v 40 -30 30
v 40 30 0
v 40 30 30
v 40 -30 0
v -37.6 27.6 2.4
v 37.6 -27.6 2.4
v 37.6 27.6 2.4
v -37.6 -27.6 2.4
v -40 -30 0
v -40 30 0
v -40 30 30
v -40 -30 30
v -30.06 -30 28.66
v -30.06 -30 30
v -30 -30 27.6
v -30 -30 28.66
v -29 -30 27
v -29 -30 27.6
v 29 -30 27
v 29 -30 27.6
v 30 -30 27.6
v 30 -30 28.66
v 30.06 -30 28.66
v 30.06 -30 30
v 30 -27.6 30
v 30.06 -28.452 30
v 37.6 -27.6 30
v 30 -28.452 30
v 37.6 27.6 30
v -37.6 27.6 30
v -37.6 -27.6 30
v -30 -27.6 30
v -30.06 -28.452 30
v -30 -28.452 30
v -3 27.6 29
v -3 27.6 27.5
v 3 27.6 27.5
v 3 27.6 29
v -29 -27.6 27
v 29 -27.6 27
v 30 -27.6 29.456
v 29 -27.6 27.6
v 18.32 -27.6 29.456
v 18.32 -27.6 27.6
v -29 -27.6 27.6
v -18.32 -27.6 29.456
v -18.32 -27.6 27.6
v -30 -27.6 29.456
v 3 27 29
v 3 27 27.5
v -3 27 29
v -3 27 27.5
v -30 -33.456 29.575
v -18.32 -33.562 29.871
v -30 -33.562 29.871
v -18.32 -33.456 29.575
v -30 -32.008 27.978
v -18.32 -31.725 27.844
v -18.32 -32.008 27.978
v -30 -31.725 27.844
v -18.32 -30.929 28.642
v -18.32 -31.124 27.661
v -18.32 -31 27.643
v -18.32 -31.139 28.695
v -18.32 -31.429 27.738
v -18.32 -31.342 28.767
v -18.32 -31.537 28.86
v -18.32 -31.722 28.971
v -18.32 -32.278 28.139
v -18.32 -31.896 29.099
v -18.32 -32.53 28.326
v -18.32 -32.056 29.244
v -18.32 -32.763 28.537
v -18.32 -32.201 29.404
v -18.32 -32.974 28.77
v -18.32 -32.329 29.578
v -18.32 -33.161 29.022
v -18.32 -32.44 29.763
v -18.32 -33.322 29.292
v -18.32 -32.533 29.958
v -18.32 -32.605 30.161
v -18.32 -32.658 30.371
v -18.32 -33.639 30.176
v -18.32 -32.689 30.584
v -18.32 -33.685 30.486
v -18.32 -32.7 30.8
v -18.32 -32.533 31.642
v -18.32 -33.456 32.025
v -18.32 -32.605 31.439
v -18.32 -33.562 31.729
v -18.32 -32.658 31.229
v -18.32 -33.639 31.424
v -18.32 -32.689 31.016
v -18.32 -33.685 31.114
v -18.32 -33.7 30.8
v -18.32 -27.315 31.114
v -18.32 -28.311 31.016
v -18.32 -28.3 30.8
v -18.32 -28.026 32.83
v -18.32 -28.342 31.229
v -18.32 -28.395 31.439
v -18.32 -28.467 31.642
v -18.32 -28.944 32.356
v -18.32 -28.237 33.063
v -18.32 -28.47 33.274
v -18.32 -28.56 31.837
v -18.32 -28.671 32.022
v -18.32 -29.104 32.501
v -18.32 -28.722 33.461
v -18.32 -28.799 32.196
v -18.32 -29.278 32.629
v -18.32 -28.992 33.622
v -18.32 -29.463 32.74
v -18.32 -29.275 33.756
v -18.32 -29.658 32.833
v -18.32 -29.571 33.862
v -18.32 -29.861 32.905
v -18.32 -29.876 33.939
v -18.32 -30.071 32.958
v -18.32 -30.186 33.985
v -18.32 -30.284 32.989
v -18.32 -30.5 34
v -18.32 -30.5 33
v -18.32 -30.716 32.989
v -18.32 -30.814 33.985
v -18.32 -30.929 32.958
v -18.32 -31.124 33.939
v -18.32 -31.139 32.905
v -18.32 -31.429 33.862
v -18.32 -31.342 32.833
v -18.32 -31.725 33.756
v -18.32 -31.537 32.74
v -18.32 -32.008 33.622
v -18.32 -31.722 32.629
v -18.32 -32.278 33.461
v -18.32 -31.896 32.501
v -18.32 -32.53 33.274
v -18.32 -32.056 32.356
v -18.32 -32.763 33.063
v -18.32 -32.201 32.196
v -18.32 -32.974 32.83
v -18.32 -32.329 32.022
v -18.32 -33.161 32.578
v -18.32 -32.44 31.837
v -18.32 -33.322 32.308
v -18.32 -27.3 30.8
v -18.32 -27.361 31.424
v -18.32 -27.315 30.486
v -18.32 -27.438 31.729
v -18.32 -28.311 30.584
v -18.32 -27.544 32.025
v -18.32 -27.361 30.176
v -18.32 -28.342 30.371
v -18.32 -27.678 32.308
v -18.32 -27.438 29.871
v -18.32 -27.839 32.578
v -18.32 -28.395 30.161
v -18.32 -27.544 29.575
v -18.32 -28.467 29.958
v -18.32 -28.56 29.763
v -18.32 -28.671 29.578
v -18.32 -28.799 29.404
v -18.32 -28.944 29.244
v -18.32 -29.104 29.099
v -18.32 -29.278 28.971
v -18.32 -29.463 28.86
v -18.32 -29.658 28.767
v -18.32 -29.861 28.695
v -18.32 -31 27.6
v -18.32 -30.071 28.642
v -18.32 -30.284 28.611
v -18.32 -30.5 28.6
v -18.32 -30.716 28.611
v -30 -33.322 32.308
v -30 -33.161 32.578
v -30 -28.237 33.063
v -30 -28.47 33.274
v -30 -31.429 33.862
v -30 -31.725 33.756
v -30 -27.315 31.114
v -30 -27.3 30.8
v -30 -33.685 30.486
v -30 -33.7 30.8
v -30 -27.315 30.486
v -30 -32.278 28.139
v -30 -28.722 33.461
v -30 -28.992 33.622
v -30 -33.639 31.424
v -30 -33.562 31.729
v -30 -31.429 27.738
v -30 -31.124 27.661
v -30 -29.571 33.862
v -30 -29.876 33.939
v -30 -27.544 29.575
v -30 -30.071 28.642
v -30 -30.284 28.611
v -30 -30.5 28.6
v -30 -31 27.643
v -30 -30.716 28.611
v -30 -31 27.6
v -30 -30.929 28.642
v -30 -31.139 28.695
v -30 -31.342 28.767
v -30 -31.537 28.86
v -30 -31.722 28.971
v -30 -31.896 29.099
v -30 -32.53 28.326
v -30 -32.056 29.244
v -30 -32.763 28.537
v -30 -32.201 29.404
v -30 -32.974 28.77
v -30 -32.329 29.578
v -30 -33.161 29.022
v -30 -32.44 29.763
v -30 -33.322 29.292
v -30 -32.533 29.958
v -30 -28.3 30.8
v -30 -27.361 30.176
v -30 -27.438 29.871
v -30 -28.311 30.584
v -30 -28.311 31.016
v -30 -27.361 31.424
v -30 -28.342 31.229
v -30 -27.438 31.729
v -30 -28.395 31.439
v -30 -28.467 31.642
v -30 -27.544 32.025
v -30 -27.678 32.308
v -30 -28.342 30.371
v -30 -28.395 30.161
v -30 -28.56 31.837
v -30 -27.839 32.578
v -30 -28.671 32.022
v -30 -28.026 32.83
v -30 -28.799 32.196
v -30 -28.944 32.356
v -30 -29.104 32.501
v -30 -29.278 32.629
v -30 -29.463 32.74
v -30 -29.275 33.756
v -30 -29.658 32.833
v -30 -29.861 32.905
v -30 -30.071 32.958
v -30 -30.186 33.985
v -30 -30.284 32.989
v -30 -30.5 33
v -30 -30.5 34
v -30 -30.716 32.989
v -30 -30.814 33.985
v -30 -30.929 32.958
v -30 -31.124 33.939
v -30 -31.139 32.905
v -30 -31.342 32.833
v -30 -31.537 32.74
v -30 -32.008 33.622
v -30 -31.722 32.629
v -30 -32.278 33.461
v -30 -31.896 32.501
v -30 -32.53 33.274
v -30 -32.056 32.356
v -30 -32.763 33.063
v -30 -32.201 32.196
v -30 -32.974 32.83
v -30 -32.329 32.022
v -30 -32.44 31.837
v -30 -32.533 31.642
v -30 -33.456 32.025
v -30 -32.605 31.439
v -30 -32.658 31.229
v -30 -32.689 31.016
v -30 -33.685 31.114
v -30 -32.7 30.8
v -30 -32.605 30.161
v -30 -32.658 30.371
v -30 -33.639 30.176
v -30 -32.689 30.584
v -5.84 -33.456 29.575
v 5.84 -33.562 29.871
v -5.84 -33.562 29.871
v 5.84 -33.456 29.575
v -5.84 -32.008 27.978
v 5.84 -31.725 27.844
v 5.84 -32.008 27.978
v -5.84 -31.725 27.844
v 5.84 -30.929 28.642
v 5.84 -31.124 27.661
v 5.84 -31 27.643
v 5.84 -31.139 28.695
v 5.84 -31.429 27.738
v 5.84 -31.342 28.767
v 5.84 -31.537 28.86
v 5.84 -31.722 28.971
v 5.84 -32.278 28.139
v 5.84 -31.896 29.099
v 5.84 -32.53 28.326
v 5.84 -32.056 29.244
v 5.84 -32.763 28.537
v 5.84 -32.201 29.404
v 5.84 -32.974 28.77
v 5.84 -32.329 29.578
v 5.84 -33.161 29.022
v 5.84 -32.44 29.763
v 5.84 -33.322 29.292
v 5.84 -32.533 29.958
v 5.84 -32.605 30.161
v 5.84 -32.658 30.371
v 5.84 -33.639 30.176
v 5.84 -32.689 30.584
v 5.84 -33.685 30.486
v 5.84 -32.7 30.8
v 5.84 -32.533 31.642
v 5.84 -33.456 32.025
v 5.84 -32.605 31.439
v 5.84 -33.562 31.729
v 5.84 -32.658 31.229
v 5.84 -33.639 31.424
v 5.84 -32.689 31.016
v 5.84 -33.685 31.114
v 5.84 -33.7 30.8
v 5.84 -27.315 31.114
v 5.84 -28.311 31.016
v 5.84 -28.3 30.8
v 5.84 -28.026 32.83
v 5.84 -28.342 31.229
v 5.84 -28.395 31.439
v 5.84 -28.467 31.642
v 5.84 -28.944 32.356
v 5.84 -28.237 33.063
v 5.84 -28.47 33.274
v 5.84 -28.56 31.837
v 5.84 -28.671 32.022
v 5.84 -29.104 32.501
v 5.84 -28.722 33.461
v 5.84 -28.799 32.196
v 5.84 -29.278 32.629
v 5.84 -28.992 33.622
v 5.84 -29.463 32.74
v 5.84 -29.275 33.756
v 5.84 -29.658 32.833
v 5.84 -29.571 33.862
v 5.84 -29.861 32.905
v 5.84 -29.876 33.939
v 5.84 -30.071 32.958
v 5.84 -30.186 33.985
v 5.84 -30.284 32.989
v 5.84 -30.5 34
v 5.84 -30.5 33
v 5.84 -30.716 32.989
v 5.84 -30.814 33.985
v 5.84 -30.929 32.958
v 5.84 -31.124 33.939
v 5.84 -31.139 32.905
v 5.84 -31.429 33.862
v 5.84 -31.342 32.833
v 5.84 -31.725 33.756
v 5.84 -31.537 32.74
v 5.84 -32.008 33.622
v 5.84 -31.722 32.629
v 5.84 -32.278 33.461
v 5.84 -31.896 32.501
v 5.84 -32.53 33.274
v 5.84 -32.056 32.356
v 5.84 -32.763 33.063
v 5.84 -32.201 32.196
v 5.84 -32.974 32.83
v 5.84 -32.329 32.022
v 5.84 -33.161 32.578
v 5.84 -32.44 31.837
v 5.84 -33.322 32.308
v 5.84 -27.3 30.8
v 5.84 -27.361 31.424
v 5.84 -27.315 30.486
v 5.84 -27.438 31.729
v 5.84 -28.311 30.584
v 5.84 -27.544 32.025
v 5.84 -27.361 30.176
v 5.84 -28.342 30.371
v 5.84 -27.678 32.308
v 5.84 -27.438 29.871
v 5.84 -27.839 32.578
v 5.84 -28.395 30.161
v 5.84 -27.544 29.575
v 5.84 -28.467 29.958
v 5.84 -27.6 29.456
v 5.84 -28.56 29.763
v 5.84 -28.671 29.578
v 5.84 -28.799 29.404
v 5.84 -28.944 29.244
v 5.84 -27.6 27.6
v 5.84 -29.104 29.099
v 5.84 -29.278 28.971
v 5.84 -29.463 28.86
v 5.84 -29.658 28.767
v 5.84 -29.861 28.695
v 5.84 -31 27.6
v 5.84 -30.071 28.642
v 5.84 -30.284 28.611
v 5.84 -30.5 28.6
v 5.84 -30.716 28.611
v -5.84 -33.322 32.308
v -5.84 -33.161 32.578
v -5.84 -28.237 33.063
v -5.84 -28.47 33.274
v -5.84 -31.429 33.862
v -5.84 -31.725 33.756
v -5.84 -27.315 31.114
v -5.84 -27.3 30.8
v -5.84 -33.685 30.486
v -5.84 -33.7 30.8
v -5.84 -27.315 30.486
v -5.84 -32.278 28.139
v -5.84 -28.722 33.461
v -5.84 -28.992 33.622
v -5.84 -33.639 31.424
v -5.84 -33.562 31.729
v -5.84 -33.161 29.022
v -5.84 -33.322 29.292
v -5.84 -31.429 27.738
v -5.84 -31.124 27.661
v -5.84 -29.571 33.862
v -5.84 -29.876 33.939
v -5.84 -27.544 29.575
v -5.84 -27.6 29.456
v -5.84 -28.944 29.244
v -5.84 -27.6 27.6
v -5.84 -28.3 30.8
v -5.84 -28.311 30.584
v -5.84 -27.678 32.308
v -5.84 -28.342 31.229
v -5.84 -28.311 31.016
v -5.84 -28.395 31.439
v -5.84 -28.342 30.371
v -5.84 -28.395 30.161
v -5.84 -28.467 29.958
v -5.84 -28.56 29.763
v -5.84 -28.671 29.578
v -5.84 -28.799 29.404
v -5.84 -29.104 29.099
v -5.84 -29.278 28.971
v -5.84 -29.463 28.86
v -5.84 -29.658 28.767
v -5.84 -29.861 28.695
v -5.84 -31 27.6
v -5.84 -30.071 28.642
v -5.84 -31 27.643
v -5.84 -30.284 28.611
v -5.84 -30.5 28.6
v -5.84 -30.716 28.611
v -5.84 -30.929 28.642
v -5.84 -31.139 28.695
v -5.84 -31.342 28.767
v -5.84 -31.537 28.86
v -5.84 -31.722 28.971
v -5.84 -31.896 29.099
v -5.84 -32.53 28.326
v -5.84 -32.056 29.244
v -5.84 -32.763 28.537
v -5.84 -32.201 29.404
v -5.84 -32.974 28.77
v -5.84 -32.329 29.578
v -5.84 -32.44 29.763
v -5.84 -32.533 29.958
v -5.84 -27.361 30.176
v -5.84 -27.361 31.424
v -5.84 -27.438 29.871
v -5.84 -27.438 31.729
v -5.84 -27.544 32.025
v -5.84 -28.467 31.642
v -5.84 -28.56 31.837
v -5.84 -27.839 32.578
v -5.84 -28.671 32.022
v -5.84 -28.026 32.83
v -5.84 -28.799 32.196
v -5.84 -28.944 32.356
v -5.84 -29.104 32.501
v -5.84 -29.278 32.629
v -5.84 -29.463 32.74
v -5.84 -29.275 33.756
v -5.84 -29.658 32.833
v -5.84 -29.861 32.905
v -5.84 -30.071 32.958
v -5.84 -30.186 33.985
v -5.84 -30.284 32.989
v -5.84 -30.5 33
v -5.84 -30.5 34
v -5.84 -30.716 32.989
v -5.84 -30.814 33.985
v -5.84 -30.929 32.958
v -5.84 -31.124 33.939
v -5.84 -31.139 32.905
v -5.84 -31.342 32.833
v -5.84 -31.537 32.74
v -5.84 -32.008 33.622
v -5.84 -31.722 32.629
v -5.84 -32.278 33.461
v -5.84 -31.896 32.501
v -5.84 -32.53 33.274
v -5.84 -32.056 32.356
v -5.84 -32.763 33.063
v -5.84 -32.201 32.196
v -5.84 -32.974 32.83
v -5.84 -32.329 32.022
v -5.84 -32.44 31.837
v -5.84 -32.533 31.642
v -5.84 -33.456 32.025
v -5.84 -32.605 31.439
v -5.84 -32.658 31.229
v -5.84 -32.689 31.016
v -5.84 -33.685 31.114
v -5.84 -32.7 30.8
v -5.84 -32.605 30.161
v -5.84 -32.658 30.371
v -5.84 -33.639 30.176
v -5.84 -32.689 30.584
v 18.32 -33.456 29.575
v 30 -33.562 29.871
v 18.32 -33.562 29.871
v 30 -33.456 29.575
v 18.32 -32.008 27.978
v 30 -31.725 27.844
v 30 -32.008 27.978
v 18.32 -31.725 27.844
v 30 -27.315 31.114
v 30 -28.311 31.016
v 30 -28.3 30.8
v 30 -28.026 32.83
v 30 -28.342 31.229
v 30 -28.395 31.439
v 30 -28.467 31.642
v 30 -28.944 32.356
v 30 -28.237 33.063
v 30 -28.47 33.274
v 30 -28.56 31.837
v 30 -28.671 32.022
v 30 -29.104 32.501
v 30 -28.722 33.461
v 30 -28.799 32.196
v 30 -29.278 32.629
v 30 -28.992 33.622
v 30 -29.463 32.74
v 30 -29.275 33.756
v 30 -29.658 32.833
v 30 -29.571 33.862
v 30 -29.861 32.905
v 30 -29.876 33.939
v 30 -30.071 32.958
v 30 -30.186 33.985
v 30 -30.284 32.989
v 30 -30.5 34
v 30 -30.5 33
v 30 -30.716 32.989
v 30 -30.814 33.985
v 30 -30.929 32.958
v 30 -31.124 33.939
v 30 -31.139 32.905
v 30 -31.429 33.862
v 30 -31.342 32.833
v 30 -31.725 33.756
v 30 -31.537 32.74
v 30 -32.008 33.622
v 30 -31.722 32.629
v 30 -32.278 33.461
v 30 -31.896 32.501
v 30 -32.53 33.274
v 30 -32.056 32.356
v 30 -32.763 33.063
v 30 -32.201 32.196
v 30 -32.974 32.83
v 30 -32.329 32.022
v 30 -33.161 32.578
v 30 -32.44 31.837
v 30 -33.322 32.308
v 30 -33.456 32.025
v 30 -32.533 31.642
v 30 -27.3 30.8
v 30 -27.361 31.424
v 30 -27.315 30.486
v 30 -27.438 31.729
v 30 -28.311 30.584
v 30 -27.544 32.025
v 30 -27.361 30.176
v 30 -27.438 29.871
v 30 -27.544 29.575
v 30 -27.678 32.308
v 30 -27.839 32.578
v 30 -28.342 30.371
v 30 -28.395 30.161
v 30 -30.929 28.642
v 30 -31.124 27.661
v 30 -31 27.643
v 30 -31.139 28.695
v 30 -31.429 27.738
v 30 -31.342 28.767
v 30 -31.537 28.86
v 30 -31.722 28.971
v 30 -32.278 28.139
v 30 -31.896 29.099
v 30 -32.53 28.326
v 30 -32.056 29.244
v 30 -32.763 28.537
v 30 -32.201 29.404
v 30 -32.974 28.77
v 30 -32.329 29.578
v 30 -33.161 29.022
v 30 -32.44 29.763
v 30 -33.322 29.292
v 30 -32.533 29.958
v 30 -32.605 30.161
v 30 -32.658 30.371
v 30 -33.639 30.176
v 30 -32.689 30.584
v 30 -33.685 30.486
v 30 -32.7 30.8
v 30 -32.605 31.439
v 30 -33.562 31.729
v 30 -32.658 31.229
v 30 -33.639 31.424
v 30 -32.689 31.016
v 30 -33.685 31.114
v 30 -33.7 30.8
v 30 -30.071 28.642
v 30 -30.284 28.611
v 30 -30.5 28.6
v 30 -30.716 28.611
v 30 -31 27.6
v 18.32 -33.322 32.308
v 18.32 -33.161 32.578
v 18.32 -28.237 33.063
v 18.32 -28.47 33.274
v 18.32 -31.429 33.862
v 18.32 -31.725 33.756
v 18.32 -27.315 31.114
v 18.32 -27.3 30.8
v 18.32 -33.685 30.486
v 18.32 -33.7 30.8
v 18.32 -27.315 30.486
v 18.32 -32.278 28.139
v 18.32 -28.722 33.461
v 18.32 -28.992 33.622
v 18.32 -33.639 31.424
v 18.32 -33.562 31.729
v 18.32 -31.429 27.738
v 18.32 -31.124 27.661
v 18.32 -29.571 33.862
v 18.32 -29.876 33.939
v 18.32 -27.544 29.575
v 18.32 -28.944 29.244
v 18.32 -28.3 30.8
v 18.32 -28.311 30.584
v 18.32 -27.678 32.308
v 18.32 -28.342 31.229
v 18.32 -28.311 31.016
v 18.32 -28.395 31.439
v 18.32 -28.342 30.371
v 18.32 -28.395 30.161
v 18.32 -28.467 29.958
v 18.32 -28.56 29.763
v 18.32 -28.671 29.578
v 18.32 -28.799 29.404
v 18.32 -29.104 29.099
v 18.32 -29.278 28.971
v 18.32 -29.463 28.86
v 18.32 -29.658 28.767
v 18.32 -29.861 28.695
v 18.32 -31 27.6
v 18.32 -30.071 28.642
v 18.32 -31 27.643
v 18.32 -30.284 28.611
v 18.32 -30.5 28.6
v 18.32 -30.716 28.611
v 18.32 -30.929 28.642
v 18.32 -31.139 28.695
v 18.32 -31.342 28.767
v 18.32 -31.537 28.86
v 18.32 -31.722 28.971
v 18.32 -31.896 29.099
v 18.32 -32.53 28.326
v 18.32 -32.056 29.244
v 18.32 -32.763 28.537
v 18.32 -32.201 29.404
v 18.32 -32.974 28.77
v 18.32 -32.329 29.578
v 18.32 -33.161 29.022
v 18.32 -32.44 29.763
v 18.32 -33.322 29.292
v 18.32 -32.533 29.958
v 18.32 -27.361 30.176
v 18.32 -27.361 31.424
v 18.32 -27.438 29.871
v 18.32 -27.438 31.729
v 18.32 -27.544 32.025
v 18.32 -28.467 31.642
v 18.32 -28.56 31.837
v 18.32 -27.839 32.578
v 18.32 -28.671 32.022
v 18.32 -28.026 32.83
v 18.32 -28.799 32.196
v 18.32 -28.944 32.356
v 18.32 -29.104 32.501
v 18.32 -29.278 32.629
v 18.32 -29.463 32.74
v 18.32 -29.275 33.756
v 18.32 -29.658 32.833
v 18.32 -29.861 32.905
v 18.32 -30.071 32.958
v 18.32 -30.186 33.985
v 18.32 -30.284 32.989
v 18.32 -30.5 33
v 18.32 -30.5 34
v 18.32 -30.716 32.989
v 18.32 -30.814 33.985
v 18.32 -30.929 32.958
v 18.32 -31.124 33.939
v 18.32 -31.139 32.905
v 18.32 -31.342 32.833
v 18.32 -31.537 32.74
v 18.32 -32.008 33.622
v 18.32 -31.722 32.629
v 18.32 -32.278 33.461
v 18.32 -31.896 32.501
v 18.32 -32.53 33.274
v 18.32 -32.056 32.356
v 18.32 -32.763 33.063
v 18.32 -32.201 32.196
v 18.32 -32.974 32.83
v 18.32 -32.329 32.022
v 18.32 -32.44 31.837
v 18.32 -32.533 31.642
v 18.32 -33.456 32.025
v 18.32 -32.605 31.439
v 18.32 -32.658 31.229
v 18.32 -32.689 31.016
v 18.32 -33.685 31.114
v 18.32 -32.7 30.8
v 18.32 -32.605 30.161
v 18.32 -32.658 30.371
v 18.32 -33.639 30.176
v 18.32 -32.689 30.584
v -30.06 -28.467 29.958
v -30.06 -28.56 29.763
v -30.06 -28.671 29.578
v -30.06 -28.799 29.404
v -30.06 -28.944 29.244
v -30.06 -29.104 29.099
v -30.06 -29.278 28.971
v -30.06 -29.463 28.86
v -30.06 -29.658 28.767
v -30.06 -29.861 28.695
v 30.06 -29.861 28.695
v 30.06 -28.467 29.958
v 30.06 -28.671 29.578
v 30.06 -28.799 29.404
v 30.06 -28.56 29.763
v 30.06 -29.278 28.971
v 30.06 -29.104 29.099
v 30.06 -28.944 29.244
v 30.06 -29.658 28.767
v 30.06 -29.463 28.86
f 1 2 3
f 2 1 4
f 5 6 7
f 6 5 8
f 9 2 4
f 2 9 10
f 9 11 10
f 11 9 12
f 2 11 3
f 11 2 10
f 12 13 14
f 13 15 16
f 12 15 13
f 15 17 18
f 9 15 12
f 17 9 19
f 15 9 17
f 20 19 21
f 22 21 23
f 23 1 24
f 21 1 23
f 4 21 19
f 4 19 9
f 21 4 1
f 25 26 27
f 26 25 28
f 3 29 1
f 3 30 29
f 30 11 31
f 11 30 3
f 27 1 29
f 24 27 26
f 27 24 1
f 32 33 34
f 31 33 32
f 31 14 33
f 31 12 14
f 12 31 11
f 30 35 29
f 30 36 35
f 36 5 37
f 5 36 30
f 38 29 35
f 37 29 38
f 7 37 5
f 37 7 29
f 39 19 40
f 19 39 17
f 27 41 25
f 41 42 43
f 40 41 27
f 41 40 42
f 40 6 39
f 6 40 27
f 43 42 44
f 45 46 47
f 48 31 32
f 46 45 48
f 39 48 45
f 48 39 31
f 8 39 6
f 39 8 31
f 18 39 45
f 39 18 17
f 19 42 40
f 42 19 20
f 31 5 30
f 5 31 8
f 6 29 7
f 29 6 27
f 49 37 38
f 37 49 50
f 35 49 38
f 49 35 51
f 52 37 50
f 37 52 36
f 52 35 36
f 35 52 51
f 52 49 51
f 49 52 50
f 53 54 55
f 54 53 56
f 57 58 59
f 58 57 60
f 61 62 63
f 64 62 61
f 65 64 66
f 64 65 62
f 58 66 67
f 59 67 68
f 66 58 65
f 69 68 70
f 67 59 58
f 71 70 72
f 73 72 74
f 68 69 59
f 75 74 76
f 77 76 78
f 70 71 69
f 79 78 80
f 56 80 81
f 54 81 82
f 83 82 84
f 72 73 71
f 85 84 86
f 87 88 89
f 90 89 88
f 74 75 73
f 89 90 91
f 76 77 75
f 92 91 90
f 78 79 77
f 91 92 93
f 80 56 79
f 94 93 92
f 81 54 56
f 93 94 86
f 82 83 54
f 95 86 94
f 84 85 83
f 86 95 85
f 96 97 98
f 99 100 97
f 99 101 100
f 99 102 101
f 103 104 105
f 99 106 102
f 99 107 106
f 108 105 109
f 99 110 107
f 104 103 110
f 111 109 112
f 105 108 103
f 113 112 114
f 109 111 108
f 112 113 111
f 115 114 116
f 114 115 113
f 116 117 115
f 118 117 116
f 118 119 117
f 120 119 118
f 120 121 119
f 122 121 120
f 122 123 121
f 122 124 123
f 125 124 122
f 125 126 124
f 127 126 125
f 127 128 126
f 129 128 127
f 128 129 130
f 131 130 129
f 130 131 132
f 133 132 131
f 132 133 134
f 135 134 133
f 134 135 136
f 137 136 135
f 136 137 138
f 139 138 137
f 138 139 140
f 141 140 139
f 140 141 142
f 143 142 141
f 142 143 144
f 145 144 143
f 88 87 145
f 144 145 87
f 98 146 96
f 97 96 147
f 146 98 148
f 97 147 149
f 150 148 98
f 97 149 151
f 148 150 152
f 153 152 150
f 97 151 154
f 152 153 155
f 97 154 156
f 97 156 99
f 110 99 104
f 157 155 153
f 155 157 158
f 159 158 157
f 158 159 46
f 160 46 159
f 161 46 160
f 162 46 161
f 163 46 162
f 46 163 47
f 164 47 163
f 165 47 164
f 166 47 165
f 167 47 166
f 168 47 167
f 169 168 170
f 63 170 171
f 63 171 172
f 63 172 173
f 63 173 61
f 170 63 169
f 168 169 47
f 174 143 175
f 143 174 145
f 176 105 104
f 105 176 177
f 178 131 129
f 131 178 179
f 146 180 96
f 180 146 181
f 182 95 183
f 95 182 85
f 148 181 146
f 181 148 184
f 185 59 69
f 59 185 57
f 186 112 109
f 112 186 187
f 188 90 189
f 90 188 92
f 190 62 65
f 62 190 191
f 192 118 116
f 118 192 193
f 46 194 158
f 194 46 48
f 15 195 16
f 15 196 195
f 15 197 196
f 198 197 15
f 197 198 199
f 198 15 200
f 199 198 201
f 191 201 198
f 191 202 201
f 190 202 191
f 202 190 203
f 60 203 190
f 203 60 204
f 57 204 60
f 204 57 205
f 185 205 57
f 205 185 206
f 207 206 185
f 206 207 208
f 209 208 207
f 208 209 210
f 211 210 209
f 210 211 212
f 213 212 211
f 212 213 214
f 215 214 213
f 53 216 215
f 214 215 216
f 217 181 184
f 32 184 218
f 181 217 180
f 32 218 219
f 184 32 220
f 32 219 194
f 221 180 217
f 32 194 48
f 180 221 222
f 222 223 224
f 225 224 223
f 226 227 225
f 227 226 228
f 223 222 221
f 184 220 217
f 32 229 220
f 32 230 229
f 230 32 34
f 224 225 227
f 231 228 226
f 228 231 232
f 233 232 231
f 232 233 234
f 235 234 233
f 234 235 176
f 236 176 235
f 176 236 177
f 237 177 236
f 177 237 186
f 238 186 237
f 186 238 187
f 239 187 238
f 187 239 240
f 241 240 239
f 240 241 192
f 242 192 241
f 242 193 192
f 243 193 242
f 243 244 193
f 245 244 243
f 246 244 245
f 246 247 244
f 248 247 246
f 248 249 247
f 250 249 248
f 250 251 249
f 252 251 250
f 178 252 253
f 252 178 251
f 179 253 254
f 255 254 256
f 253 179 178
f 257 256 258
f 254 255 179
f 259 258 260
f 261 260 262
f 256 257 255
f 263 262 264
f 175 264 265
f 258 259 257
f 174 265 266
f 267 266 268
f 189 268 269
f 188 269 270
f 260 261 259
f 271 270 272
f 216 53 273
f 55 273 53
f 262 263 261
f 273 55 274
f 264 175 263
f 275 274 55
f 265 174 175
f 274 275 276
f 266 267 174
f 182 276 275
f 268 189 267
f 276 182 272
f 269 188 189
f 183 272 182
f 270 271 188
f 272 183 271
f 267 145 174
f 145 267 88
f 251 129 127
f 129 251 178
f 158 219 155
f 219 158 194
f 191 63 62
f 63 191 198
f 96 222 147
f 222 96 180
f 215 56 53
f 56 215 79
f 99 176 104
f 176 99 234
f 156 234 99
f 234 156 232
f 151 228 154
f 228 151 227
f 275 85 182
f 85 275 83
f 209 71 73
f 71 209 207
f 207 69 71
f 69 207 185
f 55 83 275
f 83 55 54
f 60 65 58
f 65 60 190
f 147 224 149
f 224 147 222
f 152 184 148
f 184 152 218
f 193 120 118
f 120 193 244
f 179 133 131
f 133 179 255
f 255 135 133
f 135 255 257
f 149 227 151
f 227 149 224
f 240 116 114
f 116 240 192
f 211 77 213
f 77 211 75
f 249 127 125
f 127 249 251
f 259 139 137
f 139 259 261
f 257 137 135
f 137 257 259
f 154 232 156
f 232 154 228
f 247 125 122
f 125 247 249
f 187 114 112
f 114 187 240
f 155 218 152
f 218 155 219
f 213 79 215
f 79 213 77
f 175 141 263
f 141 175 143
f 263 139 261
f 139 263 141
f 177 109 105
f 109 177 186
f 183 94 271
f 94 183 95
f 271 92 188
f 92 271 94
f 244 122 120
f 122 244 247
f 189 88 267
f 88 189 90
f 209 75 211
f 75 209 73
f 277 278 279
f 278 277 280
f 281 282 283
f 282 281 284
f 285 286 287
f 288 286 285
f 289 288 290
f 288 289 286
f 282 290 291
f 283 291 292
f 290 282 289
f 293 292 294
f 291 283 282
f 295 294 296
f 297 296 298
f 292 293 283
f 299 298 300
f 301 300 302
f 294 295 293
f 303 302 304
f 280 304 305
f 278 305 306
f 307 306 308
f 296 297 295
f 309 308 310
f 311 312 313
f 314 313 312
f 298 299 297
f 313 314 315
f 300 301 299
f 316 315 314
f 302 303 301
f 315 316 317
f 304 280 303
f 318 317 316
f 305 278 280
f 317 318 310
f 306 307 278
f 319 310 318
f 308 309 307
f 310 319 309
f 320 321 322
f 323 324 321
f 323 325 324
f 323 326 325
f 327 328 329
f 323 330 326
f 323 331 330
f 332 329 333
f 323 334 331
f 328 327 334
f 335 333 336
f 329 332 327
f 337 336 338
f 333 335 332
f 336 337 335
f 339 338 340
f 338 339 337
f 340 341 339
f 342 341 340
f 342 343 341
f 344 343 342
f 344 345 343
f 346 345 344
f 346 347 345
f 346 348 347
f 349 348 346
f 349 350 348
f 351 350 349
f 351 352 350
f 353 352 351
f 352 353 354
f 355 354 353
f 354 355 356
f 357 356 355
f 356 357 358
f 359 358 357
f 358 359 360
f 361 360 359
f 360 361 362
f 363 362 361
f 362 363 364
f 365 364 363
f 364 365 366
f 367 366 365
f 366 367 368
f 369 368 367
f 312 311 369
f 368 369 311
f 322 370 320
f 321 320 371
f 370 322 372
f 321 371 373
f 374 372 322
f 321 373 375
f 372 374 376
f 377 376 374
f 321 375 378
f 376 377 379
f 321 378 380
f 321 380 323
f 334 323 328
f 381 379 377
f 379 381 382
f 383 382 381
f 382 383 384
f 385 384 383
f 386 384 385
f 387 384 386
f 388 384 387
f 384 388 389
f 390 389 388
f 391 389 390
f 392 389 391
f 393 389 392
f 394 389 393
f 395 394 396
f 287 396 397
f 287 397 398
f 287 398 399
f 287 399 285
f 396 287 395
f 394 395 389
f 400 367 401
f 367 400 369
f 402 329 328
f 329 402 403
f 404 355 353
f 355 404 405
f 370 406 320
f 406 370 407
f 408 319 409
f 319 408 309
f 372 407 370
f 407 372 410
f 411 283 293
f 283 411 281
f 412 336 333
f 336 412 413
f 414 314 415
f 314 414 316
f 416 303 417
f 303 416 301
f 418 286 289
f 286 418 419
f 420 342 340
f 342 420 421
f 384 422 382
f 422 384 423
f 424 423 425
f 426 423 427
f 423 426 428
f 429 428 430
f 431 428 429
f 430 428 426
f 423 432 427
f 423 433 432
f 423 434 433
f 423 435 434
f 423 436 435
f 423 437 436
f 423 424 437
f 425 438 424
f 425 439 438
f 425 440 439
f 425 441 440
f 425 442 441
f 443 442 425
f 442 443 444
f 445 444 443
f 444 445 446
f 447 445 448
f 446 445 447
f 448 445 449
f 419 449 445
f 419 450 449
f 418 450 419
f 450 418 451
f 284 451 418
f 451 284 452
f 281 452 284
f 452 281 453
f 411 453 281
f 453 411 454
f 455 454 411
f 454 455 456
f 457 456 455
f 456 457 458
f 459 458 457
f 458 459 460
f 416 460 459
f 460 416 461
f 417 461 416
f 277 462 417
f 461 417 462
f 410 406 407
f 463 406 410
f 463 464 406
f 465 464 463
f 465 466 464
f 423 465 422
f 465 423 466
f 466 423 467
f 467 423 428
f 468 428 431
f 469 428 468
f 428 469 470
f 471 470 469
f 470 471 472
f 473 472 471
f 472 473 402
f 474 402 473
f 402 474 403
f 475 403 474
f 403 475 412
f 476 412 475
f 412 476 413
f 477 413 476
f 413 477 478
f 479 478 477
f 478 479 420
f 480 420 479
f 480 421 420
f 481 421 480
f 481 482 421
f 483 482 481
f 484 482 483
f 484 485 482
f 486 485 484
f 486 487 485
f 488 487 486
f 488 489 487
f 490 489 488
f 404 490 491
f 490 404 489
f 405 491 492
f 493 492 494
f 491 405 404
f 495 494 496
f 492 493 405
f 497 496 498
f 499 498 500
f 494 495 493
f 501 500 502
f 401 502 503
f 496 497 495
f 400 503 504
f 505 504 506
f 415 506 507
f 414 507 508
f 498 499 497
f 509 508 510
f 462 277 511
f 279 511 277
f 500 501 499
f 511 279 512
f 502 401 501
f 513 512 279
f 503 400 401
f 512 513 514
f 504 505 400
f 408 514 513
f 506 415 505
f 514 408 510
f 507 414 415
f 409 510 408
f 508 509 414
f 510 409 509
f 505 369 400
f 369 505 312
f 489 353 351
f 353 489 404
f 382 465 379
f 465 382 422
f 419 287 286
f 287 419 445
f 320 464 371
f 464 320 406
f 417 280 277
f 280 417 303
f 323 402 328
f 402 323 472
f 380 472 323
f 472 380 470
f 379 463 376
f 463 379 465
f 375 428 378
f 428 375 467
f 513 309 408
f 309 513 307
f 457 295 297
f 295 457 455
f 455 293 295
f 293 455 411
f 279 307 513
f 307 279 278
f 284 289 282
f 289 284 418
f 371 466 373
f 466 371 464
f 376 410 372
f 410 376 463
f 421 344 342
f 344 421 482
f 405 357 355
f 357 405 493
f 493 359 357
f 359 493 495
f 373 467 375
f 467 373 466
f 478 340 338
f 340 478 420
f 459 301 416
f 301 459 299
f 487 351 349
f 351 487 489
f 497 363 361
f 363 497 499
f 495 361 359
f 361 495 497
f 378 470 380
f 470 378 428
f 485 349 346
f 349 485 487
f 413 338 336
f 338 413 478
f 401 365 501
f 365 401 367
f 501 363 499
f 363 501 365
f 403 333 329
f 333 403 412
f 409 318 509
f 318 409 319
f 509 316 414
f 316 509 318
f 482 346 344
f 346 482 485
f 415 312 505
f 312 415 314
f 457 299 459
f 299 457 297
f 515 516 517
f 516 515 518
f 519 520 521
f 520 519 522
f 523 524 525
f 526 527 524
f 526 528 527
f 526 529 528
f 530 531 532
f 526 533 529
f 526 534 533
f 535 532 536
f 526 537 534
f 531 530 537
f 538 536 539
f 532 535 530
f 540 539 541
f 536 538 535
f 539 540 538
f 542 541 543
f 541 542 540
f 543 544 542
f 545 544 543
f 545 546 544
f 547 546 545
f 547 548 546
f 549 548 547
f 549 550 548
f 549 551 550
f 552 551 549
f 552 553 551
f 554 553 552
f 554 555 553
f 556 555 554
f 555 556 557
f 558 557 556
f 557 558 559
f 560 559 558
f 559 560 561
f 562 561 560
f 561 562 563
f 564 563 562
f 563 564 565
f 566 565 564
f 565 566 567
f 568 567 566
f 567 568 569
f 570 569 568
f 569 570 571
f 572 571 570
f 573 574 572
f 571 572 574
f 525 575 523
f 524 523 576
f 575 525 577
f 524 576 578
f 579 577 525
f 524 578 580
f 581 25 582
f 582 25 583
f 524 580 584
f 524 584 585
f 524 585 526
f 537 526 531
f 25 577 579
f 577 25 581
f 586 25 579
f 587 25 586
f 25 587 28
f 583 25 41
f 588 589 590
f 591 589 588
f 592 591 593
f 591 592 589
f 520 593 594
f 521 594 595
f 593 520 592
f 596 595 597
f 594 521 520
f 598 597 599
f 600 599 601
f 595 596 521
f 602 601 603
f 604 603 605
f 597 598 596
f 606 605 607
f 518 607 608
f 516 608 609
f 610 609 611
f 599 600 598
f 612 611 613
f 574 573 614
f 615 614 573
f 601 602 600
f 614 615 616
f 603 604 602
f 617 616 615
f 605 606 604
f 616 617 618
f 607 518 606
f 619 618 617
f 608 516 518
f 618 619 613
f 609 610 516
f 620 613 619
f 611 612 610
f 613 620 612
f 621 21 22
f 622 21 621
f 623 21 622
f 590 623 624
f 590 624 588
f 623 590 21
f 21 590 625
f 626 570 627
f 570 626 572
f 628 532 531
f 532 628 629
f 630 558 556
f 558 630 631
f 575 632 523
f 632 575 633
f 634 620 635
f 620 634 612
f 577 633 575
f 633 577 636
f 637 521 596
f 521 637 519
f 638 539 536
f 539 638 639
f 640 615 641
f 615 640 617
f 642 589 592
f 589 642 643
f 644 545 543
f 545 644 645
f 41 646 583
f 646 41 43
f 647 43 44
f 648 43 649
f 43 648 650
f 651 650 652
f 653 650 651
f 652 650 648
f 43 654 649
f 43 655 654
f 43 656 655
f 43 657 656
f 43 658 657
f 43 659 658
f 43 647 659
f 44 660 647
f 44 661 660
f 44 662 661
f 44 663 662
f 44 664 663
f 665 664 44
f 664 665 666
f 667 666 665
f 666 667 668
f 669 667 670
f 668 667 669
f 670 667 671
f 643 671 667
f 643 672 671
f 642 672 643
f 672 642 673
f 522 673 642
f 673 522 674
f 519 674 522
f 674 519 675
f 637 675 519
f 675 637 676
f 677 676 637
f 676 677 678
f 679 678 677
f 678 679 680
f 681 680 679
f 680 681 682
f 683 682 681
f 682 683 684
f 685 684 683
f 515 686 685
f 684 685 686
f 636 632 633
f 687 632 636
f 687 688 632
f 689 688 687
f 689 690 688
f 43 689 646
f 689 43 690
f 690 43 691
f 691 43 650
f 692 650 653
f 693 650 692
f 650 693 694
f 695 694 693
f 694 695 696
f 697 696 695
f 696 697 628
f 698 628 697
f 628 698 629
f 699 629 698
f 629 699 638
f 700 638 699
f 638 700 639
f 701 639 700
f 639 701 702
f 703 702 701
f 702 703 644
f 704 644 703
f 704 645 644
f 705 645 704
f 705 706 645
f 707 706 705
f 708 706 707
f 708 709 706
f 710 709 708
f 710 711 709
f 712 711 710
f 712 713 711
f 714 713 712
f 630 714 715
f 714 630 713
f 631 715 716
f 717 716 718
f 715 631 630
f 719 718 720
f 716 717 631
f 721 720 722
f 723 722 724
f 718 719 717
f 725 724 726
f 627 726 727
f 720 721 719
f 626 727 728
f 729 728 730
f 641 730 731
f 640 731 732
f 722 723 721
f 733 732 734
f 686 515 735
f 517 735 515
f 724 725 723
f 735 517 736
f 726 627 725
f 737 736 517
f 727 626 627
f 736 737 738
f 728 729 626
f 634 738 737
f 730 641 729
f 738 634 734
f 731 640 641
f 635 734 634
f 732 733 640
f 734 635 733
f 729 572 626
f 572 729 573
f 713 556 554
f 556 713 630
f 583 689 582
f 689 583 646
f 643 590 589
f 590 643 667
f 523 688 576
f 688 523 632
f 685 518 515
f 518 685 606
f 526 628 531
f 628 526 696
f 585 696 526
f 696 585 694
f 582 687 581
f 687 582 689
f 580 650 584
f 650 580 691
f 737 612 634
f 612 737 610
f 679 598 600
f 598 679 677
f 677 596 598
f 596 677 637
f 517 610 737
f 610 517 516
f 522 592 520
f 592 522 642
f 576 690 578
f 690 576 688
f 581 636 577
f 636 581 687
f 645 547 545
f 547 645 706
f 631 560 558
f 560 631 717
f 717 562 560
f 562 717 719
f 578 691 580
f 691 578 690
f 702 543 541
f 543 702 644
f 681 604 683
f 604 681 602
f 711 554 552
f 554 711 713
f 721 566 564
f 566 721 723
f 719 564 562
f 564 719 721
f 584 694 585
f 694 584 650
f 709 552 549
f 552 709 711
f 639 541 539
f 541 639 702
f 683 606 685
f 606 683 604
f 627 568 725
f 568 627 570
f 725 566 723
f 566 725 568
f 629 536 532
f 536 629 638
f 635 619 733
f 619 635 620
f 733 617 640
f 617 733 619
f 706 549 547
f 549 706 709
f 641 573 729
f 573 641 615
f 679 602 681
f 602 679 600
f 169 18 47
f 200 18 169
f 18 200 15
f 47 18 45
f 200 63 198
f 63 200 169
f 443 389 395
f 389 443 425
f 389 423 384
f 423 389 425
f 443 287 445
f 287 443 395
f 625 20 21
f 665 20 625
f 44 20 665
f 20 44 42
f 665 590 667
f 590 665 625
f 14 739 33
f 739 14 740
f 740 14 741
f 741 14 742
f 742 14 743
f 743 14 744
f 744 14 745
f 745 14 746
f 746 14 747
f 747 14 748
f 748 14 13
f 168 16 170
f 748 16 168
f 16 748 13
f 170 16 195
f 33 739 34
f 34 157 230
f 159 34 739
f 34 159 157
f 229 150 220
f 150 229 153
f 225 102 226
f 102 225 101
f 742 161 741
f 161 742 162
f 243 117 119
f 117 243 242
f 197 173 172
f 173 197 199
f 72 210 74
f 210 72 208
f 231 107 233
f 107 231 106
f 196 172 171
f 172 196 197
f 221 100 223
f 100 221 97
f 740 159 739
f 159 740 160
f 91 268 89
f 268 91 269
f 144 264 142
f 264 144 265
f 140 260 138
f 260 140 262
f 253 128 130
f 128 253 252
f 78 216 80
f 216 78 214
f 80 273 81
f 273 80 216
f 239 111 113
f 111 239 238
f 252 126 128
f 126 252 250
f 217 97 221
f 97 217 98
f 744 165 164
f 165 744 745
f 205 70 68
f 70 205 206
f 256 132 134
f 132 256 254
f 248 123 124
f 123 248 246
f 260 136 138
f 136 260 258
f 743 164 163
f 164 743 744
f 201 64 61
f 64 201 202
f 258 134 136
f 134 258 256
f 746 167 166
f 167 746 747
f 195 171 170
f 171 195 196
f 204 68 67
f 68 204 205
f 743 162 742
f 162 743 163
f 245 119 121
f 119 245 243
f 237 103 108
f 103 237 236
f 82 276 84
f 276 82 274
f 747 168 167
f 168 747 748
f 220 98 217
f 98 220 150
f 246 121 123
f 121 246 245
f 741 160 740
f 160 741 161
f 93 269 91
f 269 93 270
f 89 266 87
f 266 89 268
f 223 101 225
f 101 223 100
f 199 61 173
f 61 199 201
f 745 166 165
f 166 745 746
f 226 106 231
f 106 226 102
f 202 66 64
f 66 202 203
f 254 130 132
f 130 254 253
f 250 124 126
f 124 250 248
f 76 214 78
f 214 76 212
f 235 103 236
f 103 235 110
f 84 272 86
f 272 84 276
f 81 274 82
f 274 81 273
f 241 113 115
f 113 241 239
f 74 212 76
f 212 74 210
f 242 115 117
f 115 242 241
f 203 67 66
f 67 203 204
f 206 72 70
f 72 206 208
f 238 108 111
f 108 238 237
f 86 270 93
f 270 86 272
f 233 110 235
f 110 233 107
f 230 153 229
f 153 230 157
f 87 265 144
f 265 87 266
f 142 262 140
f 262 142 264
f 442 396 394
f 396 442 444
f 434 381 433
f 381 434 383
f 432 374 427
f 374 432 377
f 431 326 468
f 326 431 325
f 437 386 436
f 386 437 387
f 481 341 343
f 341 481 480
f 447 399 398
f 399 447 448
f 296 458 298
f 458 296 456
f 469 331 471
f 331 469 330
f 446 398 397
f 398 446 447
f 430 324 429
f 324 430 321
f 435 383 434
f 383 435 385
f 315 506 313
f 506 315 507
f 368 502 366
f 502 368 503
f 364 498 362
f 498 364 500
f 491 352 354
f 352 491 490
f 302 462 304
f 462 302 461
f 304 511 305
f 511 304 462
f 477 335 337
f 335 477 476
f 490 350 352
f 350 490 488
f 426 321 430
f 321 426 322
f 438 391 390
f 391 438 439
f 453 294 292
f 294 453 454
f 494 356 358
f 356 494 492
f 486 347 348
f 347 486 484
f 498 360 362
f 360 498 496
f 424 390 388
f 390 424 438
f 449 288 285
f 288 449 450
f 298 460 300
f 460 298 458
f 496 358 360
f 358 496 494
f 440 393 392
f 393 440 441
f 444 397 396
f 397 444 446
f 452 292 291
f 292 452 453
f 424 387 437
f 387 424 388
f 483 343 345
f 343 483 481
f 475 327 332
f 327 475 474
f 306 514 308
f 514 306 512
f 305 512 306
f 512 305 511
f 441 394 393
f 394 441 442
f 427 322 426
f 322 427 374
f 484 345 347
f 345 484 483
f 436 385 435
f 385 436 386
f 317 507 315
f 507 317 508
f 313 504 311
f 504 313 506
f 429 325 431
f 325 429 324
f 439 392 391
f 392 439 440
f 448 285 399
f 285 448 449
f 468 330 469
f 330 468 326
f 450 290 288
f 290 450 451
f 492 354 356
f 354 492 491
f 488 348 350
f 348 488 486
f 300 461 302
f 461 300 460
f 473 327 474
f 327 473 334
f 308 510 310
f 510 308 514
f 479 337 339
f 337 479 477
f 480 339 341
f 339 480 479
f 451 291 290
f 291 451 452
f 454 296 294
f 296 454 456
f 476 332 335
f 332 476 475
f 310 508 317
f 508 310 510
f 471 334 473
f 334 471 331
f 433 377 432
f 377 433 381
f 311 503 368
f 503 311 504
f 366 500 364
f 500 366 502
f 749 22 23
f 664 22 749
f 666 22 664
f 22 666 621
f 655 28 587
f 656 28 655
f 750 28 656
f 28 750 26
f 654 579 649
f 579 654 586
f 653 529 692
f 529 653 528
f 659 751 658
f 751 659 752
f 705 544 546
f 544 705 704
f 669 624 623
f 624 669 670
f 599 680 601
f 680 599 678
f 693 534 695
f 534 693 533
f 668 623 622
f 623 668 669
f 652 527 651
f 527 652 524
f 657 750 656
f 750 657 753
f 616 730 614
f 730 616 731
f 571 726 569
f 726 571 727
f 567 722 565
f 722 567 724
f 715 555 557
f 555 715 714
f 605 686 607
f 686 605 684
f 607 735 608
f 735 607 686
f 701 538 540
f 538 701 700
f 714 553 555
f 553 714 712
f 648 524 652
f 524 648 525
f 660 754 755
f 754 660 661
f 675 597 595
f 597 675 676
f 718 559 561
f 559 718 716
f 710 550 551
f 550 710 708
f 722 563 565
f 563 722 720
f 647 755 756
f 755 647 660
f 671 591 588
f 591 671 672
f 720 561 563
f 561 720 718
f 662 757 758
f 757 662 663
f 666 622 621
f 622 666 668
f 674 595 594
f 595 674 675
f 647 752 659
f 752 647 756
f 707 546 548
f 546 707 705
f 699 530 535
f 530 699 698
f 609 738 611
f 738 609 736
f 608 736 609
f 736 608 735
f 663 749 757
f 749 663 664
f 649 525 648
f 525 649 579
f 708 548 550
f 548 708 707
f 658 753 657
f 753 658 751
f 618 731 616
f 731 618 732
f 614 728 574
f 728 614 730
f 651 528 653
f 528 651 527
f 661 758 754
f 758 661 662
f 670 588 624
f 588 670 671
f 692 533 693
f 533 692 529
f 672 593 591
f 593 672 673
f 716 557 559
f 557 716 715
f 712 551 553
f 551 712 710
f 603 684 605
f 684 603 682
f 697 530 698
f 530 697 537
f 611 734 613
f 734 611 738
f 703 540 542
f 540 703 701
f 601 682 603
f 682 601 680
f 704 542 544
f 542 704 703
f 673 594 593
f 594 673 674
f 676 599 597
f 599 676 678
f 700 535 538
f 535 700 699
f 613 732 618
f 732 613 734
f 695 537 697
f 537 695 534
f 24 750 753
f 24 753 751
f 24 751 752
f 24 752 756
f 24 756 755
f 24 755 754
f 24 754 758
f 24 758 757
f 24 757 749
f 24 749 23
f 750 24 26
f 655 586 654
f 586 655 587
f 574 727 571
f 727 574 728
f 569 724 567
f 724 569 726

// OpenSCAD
// Box with print-in-place hinge (v3: global bore subtraction, hinge cutouts)
part = "box";
cadverify_only = "";
module instance(name, part, unit = 1) {
    echo(cadverify_instance = [name, part, unit]);
    if (cadverify_only == "" || cadverify_only == name) children();
}

Rkn = 3.2; rbore = 2.2; rpin = 1.9;
yh = -30.5; zh = 30.8;
lid_zh = 3.4;
lid_lift = 27.4;
pin_lift_z = 27.8; pin_shift_y = -30.5;
k0x0=-30; k0x1=-18.32;
k1x0=-17.92; k1x1=-6.24;
k2x0=-5.84; k2x1=5.84;
k3x0=6.24; k3x1=17.92;
k4x0=18.32; k4x1=30;

$fn = 64;

module xcyl(x0, x1, r, y, z) {
    translate([x0, y, z]) rotate([0, 90, 0]) cylinder(r = r, h = x1 - x0);
}

module box_part() {
    difference() {
        union() {
            translate([-40, -30, 0]) cube([80, 60, 2.4]);
            translate([-40, 27.6, 2.4]) cube([80, 2.4, 27.6]);
            translate([-40, -30, 2.4]) cube([80, 2.4, 24.6]);
            translate([-40, -30, 27.0]) cube([11, 2.4, 3.0]);
            translate([29, -30, 27.0]) cube([11, 2.4, 3.0]);
            translate([-40, -27.6, 2.4]) cube([2.4, 55.2, 27.6]);
            translate([37.6, -27.6, 2.4]) cube([2.4, 55.2, 27.6]);
            translate([-3, 27.0, 27.5]) cube([6, 0.6, 1.5]);
            xcyl(k0x0, k0x1, Rkn, yh, zh);
            xcyl(k2x0, k2x1, Rkn, yh, zh);
            xcyl(k4x0, k4x1, Rkn, yh, zh);
            translate([k0x0, -31, 27.6]) cube([k0x1-k0x0, 3.4, 3.2]);
            translate([k2x0, -31, 27.6]) cube([k2x1-k2x0, 3.4, 3.2]);
            translate([k4x0, -31, 27.6]) cube([k4x1-k4x0, 3.4, 3.2]);
        }
        xcyl(k0x0-0.06, k0x1+0.06, rbore, yh, zh);
        xcyl(k2x0-0.06, k2x1+0.06, rbore, yh, zh);
        xcyl(k4x0-0.06, k4x1+0.06, rbore, yh, zh);
    }
}

module lid_part() {
    difference() {
        union() {
            translate([-40, -30, 10.6]) cube([80, 60, 2.4]);
            translate([-40, 27.6, 3]) cube([80, 2.4, 7.6]);
            translate([k1x0, -30, 3]) cube([k1x1-k1x0, 2.4, 7.6]);
            translate([k3x0, -30, 3]) cube([k3x1-k3x0, 2.4, 7.6]);
            translate([-40, -30, 3]) cube([11, 2.4, 7.6]);
            translate([29, -30, 3]) cube([11, 2.4, 7.6]);
            translate([-40, -27.6, 3]) cube([2.4, 55.2, 7.6]);
            translate([37.6, -27.6, 3]) cube([2.4, 55.2, 7.6]);
            translate([-37.2, 25.2, 0]) cube([74.4, 2.0, 10.6]);
            translate([-37.2, -27.2, 0]) cube([74.4, 2.0, 10.6]);
            translate([-37.2, -25.2, 0]) cube([2.0, 50.4, 10.6]);
            translate([35.2, -25.2, 0]) cube([2.0, 50.4, 10.6]);
            xcyl(k1x0, k1x1, Rkn, yh, lid_zh);
            xcyl(k3x0, k3x1, Rkn, yh, lid_zh);
            translate([k1x0, -31, 0]) cube([k1x1-k1x0, 3.4, 5]);
            translate([k3x0, -31, 0]) cube([k3x1-k3x0, 3.4, 5]);
        }
        xcyl(k1x0-0.06, k1x1+0.06, rbore, yh, lid_zh);
        xcyl(k3x0-0.06, k3x1+0.06, rbore, yh, lid_zh);
        translate([-3.3, 26.3, -0.05]) cube([6.6, 1.5, 2.05]);
    }
}

module pin_part() {
    union() {
        xcyl(-32.4, 32.4, rpin, 0, 3);
        xcyl(30.4, 32.4, 3, 0, 3);
        xcyl(-32.4, -30.4, 3, 0, 3);
    }
}

if (part == "box") {
    echo(cadverify_spec = [
        ["bounds", [[-40, -33.7, 0], [40, 30, 34.0]]],
        ["bodies", 1],
        ["through_holes", 3],
        ["support_faces", [["bed", "-z", 4000]]],
        ["overhangs_allowed", [["hinge knuckles, bores and wall cutouts print in place", [[-30.2, -33.9, 26.5], [30.2, -27.1, 33.5]]]]],
        ["copies", 1],
        ["details", [
            ["floor", "thickness", [0, 0, -1], [0, 0, 1], 2.4],
            ["front_wall", "thickness", [0, 31, 15], [0, -1, 0], 2.4],
            ["cavity", "void", [[-37.6, -27.6, 2.4], [37.6, 27.6, 29.9]], 0.9],
            ["hinge_bore", "hole", [-31, -30.5, 30.8], [1, 0, 0], [[0, 4.4], [11.6, 4.4]]],
            ["catch_bump", "material", [[-3, 27.0, 27.5], [3, 27.6, 29.0]], 0.9],
            ["hinge_view", "view", [[-30, -34, 26.5], [30, -27, 34.5]]]
        ]]
    ]);
    box_part();
} else if (part == "lid") {
    echo(cadverify_spec = [
        ["bounds", [[-40, -33.7, 0], [40, 30, 13]]],
        ["bodies", 1],
        ["through_holes", 2],
        ["support_faces", [["bed", "-z", 300]]],
        ["overhangs_allowed", [
            ["hinge knuckles and bores print in place", [[-18.2, -33.9, 0], [18.2, -27.1, 4.2]]],
            ["skirt cutout top bridges", [[-30.2, -30.2, 6.5], [30.2, -27.4, 7.5]]],
            ["lid top bridging over plug cavity", [[-37.2, -24.9, 10.1], [37.2, 25.2, 11.1]]]
        ]],
        ["copies", 1],
        ["details", [
            ["top", "thickness", [0, 0, 14], [0, 0, -1], 2.4],
            ["skirt", "thickness", [0, 31, 6], [0, -1, 0], 2.4],
            ["plug_cavity", "void", [[-35.2, -24.9, 0], [35.2, 25.2, 10.5]], 0.9],
            ["hinge_bore", "hole", [-18.6, -30.5, 3.4], [1, 0, 0], [[0, 4.4], [11.6, 4.4]]],
            ["catch_notch", "void", [[-3.3, 26.3, 0], [3.3, 27.8, 2.0]], 0.9],
            ["catch_view", "view", [[-5, 26, 0], [5, 28.5, 3]]]
        ]]
    ]);
    lid_part();
} else if (part == "pin") {
    echo(cadverify_spec = [
        ["bounds", [[-32.4, -3, 0], [32.4, 3, 6]]],
        ["bodies", 1],
        ["support_faces", []],
        ["overhangs_allowed", [["pin shaft underside bridges with 0.3 gap", [[-32.4, -1.9, 0], [32.4, 1.9, 1.6]]]]],
        ["copies", 1],
        ["details", [
            ["shaft", "thickness", [0, 3, 3], [0, -1, 0], 3.8],
            ["head", "material", [[30.4, -3, 0], [32.4, 3, 6]], 0.7],
            ["pin_view", "view", [[-32.4, -3, 0], [32.4, 3, 6]]]
        ]]
    ]);
    pin_part();
} else if (part == "assembly") {
    echo(cadverify_spec = [
        ["bounds", [[-40, -33.7, 0], [40, 30, 40.4]]],
        ["support_faces", [["bed", "-z", 4000]]],
        ["allowed_interferences", []],
        ["motions", [
            ["lid_open", ["lid"], "rotate", [0, -30.5, 30.8], [1, 0, 0], [0, 110], ["flex", [["lid", "box", 0.5, "catch bump clearance pass"]]]]
        ]],
        ["assembly_order", [
            [["box"], [0, 0, 0]],
            [["lid"], [0, 0, -1]],
            [["pin"], [1, 0, 0]]
        ]],
        ["print_in_place", 0.3],
        ["overhangs_allowed", [
            ["hinge undersides, pin bridge and cutouts in place", [[-33, -34, 26.5], [33, -27, 34.8]]],
            ["lid top bridging over box cavity", [[-37.2, -24.9, 37.5], [37.2, 25.2, 38.5]]]
        ]]
    ]);
    instance("box", "box") box_part();
    instance("lid", "lid") translate([0, 0, lid_lift]) lid_part();
    instance("pin", "pin") translate([0, pin_shift_y, pin_lift_z]) pin_part();
}
